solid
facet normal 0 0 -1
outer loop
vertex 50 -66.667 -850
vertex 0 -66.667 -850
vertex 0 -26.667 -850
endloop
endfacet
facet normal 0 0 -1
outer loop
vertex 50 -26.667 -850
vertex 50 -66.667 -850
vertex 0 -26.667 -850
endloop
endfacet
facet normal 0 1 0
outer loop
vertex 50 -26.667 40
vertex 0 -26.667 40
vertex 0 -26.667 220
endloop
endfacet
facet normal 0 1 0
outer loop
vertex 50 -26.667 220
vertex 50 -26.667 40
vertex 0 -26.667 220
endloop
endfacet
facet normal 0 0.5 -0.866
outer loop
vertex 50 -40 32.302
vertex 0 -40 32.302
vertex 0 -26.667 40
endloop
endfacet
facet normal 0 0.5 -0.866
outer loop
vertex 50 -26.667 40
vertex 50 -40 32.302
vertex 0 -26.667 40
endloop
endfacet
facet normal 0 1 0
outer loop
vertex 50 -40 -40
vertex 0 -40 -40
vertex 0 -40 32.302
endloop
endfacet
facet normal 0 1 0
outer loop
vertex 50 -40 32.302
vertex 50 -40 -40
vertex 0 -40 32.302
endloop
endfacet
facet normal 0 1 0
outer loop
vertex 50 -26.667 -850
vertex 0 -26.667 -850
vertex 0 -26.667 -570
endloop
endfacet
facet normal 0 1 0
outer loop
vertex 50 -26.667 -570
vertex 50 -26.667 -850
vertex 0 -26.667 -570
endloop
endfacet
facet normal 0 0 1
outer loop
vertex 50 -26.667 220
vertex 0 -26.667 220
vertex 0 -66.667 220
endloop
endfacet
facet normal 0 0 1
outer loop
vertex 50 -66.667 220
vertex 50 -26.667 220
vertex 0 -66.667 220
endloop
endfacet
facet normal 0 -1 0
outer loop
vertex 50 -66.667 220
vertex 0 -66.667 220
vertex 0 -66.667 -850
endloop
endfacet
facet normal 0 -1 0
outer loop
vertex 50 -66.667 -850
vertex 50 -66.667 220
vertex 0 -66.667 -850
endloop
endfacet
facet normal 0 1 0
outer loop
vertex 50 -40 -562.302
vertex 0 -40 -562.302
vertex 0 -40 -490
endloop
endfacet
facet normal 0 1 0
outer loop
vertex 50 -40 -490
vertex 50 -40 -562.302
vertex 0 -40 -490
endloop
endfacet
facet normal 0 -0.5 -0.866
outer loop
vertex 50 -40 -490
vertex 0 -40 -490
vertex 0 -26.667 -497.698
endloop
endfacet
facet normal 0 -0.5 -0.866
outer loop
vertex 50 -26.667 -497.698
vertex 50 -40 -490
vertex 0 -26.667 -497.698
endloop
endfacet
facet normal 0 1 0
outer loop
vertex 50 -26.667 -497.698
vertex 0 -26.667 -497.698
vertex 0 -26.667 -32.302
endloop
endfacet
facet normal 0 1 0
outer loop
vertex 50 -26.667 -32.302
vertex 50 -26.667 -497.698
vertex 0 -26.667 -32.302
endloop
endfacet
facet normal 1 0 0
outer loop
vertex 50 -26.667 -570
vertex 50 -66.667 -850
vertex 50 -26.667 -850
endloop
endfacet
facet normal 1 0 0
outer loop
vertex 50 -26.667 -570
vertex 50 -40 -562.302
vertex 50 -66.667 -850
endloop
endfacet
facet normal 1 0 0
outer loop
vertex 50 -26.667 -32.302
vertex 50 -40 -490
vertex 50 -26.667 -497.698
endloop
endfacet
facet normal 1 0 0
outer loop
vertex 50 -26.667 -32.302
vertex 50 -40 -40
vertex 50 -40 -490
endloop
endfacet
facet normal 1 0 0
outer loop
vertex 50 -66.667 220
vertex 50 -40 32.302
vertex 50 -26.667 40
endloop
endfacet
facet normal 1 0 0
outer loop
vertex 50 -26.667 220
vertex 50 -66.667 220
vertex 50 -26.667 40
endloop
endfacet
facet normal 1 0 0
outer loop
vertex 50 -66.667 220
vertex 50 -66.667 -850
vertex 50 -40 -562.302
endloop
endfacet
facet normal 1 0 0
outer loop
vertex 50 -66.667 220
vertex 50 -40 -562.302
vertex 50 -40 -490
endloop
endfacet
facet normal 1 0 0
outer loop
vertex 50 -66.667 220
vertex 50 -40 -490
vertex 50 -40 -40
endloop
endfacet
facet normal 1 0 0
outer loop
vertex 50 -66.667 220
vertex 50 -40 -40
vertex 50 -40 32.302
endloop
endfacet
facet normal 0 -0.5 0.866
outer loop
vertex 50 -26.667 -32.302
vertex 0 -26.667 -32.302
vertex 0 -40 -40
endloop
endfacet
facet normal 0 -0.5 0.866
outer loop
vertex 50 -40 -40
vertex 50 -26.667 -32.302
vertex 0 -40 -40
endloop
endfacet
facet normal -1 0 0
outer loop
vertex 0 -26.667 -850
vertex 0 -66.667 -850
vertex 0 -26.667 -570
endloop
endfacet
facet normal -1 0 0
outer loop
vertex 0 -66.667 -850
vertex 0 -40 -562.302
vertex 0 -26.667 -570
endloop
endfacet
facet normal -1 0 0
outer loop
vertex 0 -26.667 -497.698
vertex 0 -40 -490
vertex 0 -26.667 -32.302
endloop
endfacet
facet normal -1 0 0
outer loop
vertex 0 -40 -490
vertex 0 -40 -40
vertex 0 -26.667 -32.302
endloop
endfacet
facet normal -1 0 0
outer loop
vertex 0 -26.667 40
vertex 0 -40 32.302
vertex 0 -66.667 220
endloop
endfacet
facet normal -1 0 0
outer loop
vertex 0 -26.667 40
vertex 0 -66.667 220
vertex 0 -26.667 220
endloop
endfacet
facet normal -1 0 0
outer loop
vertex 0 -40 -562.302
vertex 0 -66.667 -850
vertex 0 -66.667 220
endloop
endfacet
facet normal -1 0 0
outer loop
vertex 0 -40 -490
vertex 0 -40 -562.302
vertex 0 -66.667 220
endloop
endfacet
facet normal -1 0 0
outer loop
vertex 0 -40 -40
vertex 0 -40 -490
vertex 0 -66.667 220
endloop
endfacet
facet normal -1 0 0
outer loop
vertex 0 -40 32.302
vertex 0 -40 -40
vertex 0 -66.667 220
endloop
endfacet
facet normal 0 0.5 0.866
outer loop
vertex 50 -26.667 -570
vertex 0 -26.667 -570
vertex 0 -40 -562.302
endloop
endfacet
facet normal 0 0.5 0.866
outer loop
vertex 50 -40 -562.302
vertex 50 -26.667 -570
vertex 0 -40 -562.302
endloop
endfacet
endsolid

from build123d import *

# Parameters (mm, degrees)
F2_DEPTH = 50


# Not quite as in the source:
# - a feature names something its author has since deleted; it is built from what else it names


with BuildPart() as f2:
    # F1 (on Right) → F2 (new body)
    with BuildSketch(Plane.YZ):
        Polygon((-26.6666666667, 40), (-26.6666666667, 220), (-66.6666666667, 220), (-66.6666666667, -850), (-26.6666666667, -850), (-26.6666666667, -570), (-40, -562.3019964108), (-40, -490), (-26.6666666667, -497.6980035892), (-26.6666666667, -32.3019964108), (-40, -40), (-40, 32.3019964108), align=None)
    extrude(amount=F2_DEPTH)


solid = f2.part
